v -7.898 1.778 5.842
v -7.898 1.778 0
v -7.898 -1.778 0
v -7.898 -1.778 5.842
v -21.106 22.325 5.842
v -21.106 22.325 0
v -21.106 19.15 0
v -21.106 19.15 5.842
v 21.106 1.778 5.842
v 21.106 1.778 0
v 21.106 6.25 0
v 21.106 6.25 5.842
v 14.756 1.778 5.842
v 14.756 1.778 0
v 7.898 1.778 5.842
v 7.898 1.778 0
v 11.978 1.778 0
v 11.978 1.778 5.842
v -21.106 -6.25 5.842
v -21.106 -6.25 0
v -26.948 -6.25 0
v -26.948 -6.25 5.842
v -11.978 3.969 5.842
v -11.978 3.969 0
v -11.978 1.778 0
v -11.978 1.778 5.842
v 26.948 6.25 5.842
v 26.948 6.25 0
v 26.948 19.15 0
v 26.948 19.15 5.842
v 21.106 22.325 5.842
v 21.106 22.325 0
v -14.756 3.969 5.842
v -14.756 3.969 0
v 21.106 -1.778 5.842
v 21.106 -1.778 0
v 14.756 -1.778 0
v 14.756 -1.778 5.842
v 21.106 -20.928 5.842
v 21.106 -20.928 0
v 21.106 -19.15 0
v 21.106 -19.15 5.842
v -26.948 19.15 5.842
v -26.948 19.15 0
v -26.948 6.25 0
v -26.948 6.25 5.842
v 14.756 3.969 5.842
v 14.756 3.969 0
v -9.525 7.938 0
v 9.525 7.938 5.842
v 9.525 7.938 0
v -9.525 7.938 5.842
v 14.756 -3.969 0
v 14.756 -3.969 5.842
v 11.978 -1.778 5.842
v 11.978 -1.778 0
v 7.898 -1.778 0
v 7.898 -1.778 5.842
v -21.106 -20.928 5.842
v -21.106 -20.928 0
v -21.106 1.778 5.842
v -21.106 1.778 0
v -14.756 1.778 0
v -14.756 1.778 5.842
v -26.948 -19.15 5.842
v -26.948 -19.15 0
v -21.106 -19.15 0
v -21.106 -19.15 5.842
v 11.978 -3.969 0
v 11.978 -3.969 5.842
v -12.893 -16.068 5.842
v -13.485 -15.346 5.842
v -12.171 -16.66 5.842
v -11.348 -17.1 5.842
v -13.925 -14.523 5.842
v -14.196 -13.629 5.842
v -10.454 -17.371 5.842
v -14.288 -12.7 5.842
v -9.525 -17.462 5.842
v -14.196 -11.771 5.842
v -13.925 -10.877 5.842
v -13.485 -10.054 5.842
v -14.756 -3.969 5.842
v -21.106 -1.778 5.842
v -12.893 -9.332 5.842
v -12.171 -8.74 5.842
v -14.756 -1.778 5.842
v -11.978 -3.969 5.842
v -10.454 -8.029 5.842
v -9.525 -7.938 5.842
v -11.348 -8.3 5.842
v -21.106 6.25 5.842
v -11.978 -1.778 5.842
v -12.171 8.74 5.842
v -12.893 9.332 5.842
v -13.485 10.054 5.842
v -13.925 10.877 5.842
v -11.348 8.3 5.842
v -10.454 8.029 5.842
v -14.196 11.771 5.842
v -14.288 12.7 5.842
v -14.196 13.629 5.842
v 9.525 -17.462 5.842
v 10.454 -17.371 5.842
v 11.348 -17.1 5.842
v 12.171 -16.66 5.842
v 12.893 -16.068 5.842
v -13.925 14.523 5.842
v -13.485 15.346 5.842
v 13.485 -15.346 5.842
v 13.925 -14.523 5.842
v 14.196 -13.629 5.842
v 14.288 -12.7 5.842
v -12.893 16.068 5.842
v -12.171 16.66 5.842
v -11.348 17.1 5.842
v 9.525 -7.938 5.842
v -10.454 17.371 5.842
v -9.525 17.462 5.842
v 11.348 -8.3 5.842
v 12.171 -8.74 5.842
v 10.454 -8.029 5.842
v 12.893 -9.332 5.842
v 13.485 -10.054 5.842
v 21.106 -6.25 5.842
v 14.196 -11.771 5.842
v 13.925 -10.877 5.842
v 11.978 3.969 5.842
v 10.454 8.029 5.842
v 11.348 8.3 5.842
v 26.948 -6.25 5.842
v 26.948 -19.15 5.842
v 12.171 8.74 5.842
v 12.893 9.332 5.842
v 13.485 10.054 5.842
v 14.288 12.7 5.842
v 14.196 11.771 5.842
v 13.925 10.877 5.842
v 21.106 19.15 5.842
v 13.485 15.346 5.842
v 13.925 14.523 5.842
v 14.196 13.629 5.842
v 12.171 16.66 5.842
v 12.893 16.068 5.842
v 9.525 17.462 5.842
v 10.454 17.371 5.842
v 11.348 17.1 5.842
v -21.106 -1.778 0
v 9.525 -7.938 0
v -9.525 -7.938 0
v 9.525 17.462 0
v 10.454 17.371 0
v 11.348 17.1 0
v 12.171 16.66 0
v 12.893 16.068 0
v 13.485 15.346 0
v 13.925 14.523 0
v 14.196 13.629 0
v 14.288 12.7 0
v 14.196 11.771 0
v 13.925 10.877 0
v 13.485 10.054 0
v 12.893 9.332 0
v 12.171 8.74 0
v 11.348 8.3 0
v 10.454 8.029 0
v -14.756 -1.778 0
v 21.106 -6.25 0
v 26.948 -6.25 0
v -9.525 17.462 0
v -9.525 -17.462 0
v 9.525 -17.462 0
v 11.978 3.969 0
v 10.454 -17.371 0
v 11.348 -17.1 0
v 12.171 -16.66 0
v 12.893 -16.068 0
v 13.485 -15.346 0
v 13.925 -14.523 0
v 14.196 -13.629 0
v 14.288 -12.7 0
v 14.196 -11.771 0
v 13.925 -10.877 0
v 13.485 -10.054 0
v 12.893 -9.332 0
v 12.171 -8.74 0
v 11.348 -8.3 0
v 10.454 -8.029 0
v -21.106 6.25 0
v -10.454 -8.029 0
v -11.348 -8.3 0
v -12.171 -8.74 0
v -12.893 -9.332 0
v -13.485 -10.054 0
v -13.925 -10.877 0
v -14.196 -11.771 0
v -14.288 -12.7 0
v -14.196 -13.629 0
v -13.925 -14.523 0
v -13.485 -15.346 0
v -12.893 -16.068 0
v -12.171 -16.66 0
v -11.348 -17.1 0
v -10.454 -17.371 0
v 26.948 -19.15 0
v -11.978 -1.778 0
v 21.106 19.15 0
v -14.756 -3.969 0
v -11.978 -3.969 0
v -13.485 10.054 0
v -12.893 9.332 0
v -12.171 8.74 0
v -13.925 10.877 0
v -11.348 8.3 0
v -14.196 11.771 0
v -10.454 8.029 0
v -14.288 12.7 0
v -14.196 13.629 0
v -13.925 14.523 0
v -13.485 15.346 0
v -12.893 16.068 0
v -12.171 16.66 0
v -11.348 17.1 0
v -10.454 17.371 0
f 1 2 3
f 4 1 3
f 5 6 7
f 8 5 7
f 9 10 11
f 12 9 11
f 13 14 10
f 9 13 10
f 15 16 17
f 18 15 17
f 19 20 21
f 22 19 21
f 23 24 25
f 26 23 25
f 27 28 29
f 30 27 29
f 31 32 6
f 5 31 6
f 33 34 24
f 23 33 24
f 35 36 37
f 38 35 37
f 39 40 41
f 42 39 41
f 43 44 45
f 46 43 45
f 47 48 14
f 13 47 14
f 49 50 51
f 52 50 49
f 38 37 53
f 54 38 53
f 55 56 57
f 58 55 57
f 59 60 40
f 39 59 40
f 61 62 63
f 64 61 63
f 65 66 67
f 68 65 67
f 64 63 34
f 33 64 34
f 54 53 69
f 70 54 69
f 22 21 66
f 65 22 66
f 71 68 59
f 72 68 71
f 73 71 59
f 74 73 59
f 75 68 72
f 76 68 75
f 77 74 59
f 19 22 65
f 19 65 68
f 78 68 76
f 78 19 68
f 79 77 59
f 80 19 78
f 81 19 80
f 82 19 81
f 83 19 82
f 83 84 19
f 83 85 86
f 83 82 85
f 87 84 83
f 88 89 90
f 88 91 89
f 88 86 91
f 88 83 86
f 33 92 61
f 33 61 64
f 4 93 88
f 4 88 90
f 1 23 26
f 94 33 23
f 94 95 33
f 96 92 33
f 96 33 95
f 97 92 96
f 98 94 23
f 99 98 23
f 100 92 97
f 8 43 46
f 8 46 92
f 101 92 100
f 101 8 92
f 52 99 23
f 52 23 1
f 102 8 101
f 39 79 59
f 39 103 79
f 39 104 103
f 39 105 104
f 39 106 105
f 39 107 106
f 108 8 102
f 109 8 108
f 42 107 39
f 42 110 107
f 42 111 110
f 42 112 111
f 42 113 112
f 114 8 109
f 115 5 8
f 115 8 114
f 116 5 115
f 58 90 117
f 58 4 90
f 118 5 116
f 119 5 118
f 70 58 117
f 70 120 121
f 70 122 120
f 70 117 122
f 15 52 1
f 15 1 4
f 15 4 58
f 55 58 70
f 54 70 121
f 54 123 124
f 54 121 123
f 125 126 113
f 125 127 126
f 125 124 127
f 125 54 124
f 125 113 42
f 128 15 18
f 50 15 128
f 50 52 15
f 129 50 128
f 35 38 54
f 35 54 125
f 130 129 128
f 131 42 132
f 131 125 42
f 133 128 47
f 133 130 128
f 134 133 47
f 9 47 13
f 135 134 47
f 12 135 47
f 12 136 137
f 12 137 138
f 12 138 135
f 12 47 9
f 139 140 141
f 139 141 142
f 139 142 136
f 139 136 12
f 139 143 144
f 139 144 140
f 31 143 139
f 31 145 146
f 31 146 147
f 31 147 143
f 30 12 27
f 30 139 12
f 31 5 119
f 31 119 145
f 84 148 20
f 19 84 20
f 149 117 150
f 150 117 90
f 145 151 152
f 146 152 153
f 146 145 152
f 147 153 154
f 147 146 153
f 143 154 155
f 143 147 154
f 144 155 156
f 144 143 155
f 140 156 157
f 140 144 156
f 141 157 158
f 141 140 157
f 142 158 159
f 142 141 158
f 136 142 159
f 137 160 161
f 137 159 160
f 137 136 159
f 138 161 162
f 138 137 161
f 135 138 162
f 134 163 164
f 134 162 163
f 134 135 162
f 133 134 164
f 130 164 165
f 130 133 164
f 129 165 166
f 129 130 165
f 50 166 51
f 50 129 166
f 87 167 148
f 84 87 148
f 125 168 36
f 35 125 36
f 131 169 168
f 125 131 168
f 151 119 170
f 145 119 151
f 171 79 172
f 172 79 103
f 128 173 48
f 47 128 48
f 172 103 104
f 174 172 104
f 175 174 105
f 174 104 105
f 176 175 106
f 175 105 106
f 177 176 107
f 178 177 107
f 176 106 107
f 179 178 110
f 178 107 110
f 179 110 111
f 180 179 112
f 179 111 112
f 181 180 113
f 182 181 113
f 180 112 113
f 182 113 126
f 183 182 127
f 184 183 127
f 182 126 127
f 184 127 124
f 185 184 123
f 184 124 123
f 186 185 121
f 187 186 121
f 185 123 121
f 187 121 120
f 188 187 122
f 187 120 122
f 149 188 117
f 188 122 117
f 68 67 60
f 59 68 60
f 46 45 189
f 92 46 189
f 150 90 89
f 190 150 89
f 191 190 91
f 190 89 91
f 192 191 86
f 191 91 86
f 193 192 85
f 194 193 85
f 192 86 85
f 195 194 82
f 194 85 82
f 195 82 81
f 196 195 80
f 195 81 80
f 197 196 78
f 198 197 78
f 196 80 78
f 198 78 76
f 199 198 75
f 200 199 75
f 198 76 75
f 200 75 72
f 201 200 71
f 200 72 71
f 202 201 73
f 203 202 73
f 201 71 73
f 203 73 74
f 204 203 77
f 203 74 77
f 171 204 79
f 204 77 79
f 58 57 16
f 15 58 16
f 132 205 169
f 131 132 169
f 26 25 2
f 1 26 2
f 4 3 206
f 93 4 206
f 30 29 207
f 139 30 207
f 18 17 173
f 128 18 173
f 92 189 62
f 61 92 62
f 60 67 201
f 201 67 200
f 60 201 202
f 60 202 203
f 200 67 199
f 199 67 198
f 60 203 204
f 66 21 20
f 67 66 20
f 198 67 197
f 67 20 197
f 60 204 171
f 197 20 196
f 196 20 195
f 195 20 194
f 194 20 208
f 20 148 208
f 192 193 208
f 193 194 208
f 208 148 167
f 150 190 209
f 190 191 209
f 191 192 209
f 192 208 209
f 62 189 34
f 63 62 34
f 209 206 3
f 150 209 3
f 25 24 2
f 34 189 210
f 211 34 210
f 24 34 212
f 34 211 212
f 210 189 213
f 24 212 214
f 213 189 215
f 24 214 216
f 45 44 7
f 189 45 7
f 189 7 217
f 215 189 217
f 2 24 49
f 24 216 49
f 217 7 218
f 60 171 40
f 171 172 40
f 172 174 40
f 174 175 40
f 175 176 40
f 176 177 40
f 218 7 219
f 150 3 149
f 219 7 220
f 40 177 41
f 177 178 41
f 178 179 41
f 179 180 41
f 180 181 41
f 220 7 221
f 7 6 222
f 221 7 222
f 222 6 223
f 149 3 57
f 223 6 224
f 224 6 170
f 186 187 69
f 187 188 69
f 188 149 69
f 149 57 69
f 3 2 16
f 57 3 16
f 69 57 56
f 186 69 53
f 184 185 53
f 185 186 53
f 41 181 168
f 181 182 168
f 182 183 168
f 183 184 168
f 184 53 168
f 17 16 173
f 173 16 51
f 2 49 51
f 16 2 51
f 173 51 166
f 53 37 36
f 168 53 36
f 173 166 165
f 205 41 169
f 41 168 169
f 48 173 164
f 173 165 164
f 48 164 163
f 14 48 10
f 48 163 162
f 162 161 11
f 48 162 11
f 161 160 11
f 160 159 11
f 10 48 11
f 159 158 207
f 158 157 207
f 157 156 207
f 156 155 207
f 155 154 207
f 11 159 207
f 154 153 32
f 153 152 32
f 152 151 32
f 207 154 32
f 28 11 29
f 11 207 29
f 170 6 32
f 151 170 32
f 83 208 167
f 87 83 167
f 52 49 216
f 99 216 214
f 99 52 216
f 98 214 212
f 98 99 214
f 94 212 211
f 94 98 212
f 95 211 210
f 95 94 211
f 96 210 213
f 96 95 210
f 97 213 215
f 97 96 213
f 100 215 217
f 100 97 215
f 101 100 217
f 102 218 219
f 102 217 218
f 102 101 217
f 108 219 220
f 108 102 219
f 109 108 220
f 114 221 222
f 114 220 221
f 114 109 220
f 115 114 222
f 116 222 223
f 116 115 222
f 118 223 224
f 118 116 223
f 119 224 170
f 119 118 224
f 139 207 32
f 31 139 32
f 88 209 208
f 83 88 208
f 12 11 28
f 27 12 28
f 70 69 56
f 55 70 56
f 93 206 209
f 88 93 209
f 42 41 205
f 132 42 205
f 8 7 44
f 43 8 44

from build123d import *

# Parameters (mm, degrees)
BOSS_EXTRUDE1_DEPTH = 5.842
CUT_EXTRUDE1_DEPTH  = 36.478423215


with BuildPart() as part:
    # Sketch1 → Boss-Extrude1 (new body)
    with BuildSketch(Plane.XY):
        Polygon((21.1058, -20.928), (21.1058, -19.15), (26.9478, -19.15), (26.9478, -6.25), (21.1058, -6.25), (21.1058, -1.778), (14.7558, -1.778), (14.7558, -3.96875), (11.977675, -3.96875), (11.977675, -1.778), (7.8978, -1.778), (7.8978, 1.778), (11.977675, 1.778), (11.977675, 3.96875), (14.7558, 3.96875), (14.7558, 1.778), (21.1058, 1.778), (21.1058, 6.25), (26.9478, 6.25), (26.9478, 19.15), (21.1058, 19.15), (21.1058, 22.325), (-21.1058, 22.325), (-21.1058, 19.15), (-26.9478, 19.15), (-26.9478, 6.25), (-21.1058, 6.25), (-21.1058, 1.778), (-14.7558, 1.778), (-14.7558, 3.96875), (-11.977675, 3.96875), (-11.977675, 1.778), (-7.8978, 1.778), (-7.8978, -1.778), (-11.977675, -1.778), (-11.977675, -3.96875), (-14.7558, -3.96875), (-14.7558, -1.778), (-21.1058, -1.778), (-21.1058, -6.25), (-26.9478, -6.25), (-26.9478, -19.15), (-21.1058, -19.15), (-21.1058, -20.928), align=None)
    extrude(amount=BOSS_EXTRUDE1_DEPTH)

    # Sketch2 → Cut-Extrude1 (cut, through all)
    with BuildSketch(Plane.XY.offset(5.842)):
        with BuildLine():
            Line((-9.525, 17.4625), (9.525, 17.4625))
            ThreePointArc((9.525, 17.4625), (14.2875, 12.7), (9.525, 7.9375))
            Line((9.525, 7.9375), (-9.525, 7.9375))
            ThreePointArc((-9.525, 7.9375), (-14.2875, 12.7), (-9.525, 17.4625))
        make_face()
        with BuildLine():
            Line((-9.525, -17.4625), (9.525, -17.4625))
            ThreePointArc((9.525, -17.4625), (14.2875, -12.7), (9.525, -7.9375))
            Line((9.525, -7.9375), (-9.525, -7.9375))
            ThreePointArc((-9.525, -7.9375), (-14.2875, -12.7), (-9.525, -17.4625))
        make_face()
    extrude(amount=-CUT_EXTRUDE1_DEPTH, mode=Mode.SUBTRACT)


solid = part.part
